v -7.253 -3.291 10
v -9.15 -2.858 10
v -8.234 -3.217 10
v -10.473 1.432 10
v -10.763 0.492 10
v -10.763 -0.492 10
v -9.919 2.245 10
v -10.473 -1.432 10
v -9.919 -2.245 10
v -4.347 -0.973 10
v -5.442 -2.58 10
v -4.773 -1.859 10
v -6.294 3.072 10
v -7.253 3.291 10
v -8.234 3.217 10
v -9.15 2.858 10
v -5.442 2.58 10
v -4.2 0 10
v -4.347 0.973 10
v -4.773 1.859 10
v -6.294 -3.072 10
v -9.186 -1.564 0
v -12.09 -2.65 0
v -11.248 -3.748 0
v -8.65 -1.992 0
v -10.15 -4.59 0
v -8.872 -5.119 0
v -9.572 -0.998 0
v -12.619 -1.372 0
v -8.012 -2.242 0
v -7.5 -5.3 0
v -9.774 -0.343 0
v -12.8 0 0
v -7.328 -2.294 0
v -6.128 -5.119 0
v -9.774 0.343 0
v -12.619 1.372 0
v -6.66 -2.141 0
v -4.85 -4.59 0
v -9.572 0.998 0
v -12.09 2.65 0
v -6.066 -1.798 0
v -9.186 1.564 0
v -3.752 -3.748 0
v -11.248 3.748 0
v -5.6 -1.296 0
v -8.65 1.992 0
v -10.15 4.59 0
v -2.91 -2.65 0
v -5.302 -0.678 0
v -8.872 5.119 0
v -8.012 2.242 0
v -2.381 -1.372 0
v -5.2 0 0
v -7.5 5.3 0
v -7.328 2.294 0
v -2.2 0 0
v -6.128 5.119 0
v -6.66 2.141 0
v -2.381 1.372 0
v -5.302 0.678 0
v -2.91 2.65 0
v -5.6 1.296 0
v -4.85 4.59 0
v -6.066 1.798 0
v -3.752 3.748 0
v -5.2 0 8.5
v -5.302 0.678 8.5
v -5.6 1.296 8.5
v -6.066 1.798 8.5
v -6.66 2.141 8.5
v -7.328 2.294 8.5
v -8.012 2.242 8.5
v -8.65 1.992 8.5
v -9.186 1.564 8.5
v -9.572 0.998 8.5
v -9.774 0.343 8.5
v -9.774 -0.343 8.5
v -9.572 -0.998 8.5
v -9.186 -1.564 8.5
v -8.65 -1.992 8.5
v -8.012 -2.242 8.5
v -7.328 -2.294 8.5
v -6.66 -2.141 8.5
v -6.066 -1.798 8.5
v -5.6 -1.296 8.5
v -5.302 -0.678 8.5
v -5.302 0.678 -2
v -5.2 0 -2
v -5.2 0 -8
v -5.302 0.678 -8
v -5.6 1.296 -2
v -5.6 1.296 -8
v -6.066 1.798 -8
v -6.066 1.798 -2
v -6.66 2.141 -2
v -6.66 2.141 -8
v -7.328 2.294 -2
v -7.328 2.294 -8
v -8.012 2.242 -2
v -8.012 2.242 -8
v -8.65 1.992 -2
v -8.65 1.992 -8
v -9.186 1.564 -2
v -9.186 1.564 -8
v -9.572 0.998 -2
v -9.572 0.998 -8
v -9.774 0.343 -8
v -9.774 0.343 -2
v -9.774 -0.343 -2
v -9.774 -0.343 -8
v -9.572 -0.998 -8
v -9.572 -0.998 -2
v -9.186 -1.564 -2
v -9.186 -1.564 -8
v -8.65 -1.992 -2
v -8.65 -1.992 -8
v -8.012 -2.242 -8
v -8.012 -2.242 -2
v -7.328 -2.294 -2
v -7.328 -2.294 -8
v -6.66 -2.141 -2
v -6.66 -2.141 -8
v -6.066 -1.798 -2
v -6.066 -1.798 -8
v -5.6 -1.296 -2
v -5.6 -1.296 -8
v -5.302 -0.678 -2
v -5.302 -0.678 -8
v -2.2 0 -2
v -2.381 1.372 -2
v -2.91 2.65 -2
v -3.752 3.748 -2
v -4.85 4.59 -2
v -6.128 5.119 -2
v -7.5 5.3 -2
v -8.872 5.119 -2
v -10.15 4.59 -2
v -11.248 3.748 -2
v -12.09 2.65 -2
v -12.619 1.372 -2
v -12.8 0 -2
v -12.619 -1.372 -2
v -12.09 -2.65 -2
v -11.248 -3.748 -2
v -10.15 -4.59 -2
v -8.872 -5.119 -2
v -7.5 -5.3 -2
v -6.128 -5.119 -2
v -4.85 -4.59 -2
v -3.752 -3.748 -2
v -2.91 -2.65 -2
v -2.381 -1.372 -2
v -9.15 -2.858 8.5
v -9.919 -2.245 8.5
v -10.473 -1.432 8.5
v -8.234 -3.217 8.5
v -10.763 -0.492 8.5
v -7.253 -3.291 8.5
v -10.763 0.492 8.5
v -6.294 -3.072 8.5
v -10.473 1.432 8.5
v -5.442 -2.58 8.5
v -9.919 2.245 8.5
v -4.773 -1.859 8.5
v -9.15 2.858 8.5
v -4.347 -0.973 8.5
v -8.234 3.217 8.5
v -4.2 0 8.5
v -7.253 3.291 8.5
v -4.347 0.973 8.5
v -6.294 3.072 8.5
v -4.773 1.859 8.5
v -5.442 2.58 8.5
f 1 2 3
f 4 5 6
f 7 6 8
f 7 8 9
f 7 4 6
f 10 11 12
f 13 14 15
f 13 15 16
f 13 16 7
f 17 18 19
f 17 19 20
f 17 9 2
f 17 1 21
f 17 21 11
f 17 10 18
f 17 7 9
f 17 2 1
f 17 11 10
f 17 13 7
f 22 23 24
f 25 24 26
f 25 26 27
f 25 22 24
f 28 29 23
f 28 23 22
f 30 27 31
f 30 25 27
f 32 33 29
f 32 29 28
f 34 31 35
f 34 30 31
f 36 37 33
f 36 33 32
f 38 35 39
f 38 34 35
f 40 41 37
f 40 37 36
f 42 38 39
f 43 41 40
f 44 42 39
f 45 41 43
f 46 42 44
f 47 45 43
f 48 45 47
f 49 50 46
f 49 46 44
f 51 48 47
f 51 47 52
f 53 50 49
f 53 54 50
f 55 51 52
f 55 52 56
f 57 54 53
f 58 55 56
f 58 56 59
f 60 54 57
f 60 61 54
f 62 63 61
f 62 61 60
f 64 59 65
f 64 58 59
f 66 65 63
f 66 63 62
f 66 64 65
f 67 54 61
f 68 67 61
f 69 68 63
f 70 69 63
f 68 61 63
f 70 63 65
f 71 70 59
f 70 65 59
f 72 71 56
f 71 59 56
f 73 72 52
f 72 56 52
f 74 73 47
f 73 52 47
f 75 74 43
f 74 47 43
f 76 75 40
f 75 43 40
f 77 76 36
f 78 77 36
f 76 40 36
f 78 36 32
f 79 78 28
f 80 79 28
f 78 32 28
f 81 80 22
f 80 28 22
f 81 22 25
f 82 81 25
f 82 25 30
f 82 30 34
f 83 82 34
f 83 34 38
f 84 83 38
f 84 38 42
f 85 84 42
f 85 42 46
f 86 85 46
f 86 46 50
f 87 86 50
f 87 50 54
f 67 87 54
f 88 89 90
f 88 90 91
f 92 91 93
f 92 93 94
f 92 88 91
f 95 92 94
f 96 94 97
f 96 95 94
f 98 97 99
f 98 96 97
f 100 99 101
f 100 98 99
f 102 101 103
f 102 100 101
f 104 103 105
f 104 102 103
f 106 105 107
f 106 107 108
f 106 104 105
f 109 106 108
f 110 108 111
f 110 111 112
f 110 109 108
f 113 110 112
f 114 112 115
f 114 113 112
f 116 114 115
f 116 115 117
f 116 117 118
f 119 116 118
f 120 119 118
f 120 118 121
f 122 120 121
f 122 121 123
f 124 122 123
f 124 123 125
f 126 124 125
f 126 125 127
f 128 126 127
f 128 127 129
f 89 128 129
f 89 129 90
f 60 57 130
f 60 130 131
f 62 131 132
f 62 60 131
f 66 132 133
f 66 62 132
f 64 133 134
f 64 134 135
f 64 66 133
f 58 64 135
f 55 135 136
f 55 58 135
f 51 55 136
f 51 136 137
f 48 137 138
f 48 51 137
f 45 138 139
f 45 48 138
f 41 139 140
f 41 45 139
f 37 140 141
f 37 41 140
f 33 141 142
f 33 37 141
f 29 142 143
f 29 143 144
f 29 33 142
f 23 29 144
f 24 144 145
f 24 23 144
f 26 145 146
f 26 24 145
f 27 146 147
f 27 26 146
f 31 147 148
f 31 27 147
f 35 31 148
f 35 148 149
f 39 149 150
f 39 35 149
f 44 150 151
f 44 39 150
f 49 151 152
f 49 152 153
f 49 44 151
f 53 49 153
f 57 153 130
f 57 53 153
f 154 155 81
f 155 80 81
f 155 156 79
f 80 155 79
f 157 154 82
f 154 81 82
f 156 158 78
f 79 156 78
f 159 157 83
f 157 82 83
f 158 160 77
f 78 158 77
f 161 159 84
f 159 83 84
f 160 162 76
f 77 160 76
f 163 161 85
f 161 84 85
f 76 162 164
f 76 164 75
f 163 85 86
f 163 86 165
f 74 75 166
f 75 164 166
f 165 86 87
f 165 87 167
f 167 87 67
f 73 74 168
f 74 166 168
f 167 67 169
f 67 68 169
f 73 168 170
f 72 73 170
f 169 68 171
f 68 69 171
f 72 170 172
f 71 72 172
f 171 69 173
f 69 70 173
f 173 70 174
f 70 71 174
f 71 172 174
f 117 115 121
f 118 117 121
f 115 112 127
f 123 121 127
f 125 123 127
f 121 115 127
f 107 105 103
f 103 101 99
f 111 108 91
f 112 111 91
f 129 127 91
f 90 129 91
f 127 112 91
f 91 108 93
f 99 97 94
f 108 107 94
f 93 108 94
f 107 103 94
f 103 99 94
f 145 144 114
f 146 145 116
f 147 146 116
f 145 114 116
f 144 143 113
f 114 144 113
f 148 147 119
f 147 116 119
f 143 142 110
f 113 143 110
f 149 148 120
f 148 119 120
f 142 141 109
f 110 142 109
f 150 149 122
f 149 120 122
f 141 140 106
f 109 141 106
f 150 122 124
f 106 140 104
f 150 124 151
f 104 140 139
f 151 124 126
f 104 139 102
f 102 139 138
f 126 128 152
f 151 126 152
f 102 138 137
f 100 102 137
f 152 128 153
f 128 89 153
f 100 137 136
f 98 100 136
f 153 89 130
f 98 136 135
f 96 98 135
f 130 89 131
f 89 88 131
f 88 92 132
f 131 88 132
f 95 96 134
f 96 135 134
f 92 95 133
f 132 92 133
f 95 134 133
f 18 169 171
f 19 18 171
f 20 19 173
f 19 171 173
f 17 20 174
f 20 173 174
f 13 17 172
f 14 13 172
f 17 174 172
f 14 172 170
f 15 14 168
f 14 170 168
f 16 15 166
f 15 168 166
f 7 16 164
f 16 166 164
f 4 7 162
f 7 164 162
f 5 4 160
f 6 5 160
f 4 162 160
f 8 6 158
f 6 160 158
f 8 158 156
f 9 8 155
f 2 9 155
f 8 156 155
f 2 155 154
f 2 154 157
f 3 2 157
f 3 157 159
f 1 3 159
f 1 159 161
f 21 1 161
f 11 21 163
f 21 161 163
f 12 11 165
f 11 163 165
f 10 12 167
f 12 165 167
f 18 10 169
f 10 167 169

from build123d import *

# Parameters (mm, degrees)
F0_R          = 3.3
F0_R_2        = 2.3
F1_DEPTH      = 2
F2_DEPTH      = 10
F2_DEPTH_BACK = 8
F3_START      = 8.5
F3_DEPTH      = 1.5


with BuildPart() as f1:
    # F0 (on Top) → F1 (new body)
    with BuildSketch(Plane.XY):
        with BuildLine():
            ThreePointArc((-2.2, 0), (-3.7523340597, 3.7476659403), (-7.5, 5.3))
            ThreePointArc((-7.5, 5.3), (-12.8, 0), (-7.5, -5.3))
            ThreePointArc((-7.5, -5.3), (-3.7523340597, -3.7476659403), (-2.2, 0))
        make_face()
        with Locations((-7.5, 0)):
            Circle(F0_R, mode=Mode.SUBTRACT)
        with Locations((-7.5, 0)):
            Circle(F0_R)
        with Locations((-7.5, 0)):
            Circle(F0_R_2, mode=Mode.SUBTRACT)
    extrude(amount=-F1_DEPTH)

    # F0 (on Top) → F2 (join, two sides)
    with BuildSketch(Plane.XY) as f2_sk:
        with Locations((-7.5, 0)):
            Circle(F0_R_2)
    extrude(amount=F2_DEPTH)
    extrude(f2_sk.sketch, amount=-F2_DEPTH_BACK)

    # F0 (on Top) → F3 (join)
    with BuildSketch(Plane.XY.offset(F3_START)):
        with Locations((-7.5, 0)):
            Circle(F0_R)
        with Locations((-7.5, 0)):
            Circle(F0_R_2, mode=Mode.SUBTRACT)
    extrude(amount=F3_DEPTH)


solid = f1.part
